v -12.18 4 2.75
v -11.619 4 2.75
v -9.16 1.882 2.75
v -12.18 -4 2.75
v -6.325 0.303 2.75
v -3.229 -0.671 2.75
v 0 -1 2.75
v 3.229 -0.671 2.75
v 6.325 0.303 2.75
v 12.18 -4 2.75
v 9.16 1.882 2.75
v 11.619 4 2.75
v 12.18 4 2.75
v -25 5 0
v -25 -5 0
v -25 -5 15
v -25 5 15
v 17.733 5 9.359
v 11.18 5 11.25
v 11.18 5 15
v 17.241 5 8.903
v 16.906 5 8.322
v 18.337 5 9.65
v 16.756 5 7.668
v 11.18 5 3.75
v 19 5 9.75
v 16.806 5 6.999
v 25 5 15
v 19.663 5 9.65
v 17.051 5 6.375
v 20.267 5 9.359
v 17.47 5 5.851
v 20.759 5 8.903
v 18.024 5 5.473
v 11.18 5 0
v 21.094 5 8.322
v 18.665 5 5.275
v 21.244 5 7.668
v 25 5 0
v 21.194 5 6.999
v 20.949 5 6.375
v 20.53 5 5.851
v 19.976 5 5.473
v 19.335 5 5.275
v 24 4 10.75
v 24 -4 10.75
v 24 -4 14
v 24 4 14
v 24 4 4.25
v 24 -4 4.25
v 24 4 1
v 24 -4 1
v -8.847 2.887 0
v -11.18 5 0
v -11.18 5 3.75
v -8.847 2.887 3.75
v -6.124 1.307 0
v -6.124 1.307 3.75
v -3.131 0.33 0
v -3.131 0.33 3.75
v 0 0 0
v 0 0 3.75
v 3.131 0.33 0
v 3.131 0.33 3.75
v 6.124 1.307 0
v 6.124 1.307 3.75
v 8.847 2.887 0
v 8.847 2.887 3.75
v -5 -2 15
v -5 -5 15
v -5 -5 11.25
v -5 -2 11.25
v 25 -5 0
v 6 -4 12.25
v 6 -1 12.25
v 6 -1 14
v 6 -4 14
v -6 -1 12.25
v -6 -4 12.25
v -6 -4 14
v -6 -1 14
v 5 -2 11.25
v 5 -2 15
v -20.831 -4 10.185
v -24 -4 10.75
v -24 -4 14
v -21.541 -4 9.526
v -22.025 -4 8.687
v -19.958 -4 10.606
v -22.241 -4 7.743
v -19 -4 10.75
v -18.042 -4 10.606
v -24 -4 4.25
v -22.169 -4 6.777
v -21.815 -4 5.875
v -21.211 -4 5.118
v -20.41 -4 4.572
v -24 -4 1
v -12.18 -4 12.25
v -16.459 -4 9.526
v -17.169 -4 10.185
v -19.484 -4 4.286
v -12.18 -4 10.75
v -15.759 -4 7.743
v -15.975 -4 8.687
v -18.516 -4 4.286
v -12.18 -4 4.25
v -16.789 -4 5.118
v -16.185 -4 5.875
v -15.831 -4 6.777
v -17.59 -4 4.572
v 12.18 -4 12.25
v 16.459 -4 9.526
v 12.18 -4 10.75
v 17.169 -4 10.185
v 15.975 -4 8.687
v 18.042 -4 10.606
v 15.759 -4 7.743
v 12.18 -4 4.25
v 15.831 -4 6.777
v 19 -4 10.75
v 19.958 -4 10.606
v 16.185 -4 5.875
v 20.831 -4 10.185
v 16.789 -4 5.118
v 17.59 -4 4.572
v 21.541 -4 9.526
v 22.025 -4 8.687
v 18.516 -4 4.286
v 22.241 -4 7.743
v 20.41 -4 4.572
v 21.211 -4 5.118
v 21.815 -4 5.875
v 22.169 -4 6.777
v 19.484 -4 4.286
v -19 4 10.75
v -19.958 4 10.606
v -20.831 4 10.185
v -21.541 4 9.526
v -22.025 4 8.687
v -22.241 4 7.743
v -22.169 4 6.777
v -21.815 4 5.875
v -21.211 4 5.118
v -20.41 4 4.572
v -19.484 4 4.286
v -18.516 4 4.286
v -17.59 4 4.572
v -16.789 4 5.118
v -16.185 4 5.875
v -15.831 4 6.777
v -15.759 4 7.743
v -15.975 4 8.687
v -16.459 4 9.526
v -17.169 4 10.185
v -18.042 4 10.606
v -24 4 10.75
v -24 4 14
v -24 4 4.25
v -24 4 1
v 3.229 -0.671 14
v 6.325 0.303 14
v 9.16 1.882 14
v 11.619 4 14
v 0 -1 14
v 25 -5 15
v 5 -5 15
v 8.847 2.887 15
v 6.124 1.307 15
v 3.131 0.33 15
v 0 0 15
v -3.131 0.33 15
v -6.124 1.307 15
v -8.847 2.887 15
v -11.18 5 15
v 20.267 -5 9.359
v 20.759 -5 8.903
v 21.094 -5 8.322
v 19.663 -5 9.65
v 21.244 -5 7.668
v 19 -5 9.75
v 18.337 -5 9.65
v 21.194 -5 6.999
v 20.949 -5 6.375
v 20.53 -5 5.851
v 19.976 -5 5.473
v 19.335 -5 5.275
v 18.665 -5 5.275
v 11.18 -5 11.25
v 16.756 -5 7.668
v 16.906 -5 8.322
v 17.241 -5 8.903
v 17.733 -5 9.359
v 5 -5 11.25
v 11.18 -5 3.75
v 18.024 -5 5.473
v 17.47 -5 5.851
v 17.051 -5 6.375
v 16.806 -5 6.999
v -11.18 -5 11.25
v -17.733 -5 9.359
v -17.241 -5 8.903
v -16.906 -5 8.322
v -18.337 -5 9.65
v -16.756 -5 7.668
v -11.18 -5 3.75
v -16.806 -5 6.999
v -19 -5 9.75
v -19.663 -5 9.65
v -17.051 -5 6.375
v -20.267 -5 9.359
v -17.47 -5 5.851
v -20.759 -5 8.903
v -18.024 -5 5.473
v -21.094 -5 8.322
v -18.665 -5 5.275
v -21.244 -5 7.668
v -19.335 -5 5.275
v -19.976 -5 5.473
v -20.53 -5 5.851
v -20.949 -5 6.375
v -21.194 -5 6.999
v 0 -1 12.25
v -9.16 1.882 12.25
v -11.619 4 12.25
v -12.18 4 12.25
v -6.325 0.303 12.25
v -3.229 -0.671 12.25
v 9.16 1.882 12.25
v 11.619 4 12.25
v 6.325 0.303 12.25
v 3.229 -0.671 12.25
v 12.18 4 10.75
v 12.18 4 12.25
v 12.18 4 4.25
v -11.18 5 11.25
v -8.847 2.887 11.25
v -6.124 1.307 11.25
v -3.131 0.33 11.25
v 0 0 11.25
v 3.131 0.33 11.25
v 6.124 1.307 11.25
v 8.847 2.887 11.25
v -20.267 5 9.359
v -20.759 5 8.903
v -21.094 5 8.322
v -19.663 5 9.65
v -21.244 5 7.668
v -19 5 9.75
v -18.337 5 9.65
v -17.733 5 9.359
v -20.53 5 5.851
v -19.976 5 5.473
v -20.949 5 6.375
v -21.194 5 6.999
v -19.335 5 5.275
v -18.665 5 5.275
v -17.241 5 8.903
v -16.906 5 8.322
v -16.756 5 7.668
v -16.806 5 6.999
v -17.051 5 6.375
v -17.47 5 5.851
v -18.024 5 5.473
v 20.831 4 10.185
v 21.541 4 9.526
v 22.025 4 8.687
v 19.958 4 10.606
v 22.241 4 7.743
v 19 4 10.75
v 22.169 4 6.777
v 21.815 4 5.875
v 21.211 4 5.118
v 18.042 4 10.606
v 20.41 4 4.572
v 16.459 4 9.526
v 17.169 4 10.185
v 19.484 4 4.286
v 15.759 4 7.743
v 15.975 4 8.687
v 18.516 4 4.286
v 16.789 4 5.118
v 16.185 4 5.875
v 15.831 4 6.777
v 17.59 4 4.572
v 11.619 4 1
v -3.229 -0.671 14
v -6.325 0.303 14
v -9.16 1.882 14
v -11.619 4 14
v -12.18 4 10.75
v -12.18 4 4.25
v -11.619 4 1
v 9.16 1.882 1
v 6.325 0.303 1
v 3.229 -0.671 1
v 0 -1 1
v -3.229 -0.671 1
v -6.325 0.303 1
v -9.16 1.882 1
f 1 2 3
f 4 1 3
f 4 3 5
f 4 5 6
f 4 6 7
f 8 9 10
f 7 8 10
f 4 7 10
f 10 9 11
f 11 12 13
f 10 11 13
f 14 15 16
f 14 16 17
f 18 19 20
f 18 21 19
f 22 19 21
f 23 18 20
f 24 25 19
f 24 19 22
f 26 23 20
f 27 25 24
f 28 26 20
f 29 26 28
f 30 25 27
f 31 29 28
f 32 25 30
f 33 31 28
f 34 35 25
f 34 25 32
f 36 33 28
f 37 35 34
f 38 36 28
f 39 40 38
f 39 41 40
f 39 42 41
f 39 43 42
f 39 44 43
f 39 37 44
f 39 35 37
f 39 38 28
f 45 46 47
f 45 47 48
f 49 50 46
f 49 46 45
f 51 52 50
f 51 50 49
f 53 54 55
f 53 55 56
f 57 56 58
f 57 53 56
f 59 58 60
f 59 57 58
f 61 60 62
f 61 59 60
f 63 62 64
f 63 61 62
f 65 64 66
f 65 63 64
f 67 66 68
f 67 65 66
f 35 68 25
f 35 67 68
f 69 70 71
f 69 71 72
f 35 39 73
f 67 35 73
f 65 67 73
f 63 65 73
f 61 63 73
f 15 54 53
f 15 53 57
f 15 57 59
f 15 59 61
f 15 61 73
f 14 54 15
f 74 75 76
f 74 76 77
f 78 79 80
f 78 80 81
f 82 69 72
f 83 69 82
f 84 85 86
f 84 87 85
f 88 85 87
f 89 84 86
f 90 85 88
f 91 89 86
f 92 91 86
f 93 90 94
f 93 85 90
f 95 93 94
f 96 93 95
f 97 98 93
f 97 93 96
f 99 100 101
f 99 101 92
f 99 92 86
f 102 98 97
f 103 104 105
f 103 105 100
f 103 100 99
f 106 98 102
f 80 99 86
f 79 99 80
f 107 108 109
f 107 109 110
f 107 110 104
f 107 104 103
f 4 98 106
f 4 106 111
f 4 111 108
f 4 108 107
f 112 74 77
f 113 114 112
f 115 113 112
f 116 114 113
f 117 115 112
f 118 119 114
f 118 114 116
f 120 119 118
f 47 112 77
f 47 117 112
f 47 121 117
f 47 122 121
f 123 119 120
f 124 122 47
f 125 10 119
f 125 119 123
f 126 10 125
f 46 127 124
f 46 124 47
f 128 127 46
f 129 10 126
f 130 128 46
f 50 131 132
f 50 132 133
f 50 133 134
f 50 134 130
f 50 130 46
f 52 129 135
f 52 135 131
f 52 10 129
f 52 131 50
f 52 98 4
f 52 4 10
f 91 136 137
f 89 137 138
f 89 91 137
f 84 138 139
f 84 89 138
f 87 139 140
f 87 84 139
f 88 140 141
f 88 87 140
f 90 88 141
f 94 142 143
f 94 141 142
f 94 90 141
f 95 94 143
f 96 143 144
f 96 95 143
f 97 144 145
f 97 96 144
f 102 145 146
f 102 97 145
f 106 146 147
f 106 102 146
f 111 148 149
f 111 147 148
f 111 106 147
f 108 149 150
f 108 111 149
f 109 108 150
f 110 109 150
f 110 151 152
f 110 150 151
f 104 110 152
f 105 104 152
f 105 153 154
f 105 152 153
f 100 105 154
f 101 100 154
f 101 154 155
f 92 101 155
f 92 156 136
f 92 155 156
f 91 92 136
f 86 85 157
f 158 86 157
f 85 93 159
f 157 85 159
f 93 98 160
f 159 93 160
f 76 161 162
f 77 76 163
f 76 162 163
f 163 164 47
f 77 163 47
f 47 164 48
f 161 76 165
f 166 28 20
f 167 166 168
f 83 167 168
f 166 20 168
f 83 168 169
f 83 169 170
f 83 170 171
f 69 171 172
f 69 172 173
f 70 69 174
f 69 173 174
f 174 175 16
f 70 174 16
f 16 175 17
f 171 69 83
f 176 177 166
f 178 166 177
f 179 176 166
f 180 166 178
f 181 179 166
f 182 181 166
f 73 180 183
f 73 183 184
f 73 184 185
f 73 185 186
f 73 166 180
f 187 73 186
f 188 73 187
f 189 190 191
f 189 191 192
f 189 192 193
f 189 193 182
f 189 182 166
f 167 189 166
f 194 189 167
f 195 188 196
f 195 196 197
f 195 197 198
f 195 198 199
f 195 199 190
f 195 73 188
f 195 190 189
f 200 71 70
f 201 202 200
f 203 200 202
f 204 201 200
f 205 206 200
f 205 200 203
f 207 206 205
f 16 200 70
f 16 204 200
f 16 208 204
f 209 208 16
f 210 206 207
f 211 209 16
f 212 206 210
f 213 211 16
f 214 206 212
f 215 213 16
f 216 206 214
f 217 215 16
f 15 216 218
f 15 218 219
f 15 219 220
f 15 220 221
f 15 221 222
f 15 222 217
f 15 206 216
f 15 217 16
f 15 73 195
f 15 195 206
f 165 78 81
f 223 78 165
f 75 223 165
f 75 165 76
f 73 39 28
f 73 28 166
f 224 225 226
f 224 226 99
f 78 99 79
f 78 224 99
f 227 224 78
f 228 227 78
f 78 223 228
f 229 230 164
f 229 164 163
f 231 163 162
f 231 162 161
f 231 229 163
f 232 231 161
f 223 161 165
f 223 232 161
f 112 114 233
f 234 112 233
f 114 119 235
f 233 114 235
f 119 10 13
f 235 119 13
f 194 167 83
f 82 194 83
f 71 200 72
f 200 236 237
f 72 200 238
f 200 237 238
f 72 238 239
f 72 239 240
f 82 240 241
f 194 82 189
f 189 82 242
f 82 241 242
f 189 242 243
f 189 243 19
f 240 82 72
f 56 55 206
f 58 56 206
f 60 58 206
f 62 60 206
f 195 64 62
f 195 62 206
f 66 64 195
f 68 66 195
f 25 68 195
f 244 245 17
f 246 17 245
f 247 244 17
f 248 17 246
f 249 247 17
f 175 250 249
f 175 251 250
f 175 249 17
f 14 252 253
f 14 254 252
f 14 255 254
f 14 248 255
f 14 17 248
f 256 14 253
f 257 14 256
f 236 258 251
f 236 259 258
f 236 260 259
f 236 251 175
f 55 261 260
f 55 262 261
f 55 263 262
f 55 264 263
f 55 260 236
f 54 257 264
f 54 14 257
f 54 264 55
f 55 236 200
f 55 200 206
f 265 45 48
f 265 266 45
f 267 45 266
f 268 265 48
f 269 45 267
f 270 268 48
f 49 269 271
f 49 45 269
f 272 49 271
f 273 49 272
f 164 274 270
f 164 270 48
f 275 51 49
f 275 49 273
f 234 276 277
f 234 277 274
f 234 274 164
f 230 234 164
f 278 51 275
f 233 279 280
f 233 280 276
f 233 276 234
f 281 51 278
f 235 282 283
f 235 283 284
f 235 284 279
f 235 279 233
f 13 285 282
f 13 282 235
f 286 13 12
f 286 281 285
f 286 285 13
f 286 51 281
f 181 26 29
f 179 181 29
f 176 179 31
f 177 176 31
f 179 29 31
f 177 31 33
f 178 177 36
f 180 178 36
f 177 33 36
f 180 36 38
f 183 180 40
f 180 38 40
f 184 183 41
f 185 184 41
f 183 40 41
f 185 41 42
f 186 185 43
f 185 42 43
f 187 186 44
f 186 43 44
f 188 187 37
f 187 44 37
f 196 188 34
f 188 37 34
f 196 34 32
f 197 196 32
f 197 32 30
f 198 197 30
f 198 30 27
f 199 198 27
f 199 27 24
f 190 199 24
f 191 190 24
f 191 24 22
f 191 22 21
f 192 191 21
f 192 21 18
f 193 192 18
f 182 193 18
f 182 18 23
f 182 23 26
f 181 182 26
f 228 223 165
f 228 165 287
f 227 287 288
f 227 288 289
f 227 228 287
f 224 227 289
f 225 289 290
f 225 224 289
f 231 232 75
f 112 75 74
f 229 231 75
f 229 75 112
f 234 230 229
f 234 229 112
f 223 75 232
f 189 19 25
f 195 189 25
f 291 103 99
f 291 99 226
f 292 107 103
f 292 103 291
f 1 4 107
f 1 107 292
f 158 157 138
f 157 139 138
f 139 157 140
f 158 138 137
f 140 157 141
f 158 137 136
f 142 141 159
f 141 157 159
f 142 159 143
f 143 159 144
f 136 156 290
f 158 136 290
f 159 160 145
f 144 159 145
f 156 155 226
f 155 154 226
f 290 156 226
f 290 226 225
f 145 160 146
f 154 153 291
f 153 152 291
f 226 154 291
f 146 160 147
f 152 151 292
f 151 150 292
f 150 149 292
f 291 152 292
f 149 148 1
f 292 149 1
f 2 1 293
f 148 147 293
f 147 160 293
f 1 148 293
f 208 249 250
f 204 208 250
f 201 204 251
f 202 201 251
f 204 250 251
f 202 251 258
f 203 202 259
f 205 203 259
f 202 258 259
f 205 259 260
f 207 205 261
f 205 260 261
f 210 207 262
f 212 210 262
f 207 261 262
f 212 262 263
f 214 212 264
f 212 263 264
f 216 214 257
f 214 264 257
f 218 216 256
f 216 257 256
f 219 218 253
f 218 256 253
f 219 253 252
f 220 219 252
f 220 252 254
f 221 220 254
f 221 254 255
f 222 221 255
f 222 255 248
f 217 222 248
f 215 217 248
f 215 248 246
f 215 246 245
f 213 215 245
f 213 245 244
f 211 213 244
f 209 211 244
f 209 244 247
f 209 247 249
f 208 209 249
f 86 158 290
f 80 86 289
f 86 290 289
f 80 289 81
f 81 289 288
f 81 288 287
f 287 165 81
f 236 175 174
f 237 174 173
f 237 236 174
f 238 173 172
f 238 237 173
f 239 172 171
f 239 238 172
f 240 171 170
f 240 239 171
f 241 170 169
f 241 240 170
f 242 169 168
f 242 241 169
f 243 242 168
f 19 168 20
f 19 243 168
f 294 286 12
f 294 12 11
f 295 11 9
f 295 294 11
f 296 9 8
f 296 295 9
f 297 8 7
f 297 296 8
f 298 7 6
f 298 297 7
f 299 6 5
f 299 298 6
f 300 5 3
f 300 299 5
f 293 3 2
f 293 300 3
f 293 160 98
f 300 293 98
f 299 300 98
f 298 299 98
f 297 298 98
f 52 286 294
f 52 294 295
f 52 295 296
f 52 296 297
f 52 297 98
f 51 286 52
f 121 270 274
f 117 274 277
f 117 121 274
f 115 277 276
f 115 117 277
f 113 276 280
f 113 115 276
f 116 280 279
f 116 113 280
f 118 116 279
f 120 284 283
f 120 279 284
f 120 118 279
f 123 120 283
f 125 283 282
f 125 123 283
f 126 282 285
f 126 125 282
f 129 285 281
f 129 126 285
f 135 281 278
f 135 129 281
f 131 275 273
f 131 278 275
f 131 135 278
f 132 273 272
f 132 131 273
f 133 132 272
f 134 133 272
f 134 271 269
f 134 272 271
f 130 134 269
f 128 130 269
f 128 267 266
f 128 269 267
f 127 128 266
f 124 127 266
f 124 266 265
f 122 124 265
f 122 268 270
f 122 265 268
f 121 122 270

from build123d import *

# Parameters (mm, degrees)
BOSS_EXTRUDE1_DEPTH = 15
CUT_EXTRUDE1_REACH  = 32.822
SKETCH3_W           = 22.360679774
SKETCH3_H           = 7.5
CUT_EXTRUDE2_REACH  = 31.58
SKETCH2_W           = 10
SKETCH2_H           = 3
CUT_EXTRUDE3_REACH  = 32.822
SKETCH4_R           = 2.25
SHELL2_START        = 1
SHELL2_OUTLINE_W    = 11.819660113
SHELL2_OUTLINE_H    = 8
SHELL2_DEPTH        = 3.2499999
SHELL2_START_2      = 10.7500001
SHELL2_2_OUTLINE_W  = 11.819660113
SHELL2_2_OUTLINE_H  = 8
SHELL2_2_DEPTH      = 3.2499999
SHELL2_3_DEPTH      = 1.75
SHELL2_START_3      = 12.25
SHELL2_4_DEPTH      = 1.75
SHELL2_START_4      = -4
SHELL2_5_DEPTH      = 8


with BuildPart() as part:
    # Sketch1 → Boss-Extrude1 (new body)
    with BuildSketch(Plane.XY):
        with BuildLine():
            Line((-25, 5), (-11.180339887, 5))
            ThreePointArc((-11.180339887, 5), (0, 0), (11.180339887, 5))
            Line((11.180339887, 5), (25, 5))
            Line((25, 5), (25, -5))
            Line((25, -5), (-25, -5))
            Line((-25, -5), (-25, 5))
        make_face()
    extrude(amount=BOSS_EXTRUDE1_DEPTH)

    # Sketch3 → Cut-Extrude1 (cut, up to next)
    with BuildSketch(Plane(origin=(0, 5, 0), x_dir=(1, 0, 0), z_dir=(0, 1, 0)), mode=Mode.PRIVATE) as cut_extrude1_sk1:
        with Locations((0, -7.5)):
            Rectangle(SKETCH3_W, SKETCH3_H)
    cut_extrude1_tool1 = extrude(cut_extrude1_sk1.sketch, amount=-CUT_EXTRUDE1_REACH, mode=Mode.PRIVATE) & part.part
    add(cut_extrude1_tool1.solids().sort_by_distance((0, 5, 7.5))[0], mode=Mode.SUBTRACT)

    # Sketch2 → Cut-Extrude2 (cut, up to next)
    with BuildSketch(Plane.XY.offset(15), mode=Mode.PRIVATE) as cut_extrude2_sk1:
        with Locations((0, -3.5)):
            Rectangle(SKETCH2_W, SKETCH2_H)
    cut_extrude2_tool1 = extrude(cut_extrude2_sk1.sketch, amount=-CUT_EXTRUDE2_REACH, mode=Mode.PRIVATE) & part.part
    add(cut_extrude2_tool1.solids().sort_by_distance((0, -3.5, 15))[0], mode=Mode.SUBTRACT)

    # Sketch4 → Cut-Extrude3 (cut, up to next)
    with BuildSketch(Plane(origin=(0, 5, 0), x_dir=(1, 0, 0), z_dir=(0, 1, 0)), mode=Mode.PRIVATE) as cut_extrude3_sk1:
        with Locations(Location((-19, -7.5, 0), (0, 0, 270))):
            Circle(SKETCH4_R)
    cut_extrude3_tool1 = extrude(cut_extrude3_sk1.sketch, amount=-CUT_EXTRUDE3_REACH, mode=Mode.PRIVATE) & part.part
    # Sketch4 → Cut-Extrude3 (cut, up to next)
    with BuildSketch(Plane(origin=(0, 5, 0), x_dir=(1, 0, 0), z_dir=(0, 1, 0)), mode=Mode.PRIVATE) as cut_extrude3_sk2:
        with Locations(Location((19, -7.5, 0), (0, 0, 270))):
            Circle(SKETCH4_R)
    cut_extrude3_tool2 = extrude(cut_extrude3_sk2.sketch, amount=-CUT_EXTRUDE3_REACH, mode=Mode.PRIVATE) & part.part
    add(cut_extrude3_tool1.solids().sort_by_distance((-19, 5, 7.5))[0], mode=Mode.SUBTRACT)
    add(cut_extrude3_tool2.solids().sort_by_distance((19, 5, 7.5))[0], mode=Mode.SUBTRACT)

    # Shell2: read off the stored shape, not the designer's step
    # Shell2 outline → Shell2 (cut)
    with BuildSketch(Plane.XY.offset(SHELL2_START)):
        with Locations((18.090169944, 0)):
            Rectangle(SHELL2_OUTLINE_W, SHELL2_OUTLINE_H)
        with Locations((-18.090169944, 0)):
            Rectangle(SHELL2_OUTLINE_W, SHELL2_OUTLINE_H)
    extrude(amount=SHELL2_DEPTH, mode=Mode.SUBTRACT)

    # Shell2 2 outline → Shell2 2 (cut)
    with BuildSketch(Plane.XY.offset(SHELL2_START_2)):
        with Locations((18.090169944, 0)):
            Rectangle(SHELL2_2_OUTLINE_W, SHELL2_2_OUTLINE_H)
        with Locations((-18.090169944, 0)):
            Rectangle(SHELL2_2_OUTLINE_W, SHELL2_2_OUTLINE_H)
    extrude(amount=SHELL2_2_DEPTH, mode=Mode.SUBTRACT)

    # Shell2 3 outline → Shell2 3 (cut)
    with BuildSketch(Plane.XY.offset(SHELL2_START)):
        with BuildLine():
            Line((12.180339887, 4), (11.618950039, 4))
            ThreePointArc((11.618950039, 4), (0, -1), (-11.618950039, 4))
            Line((-11.618950039, 4), (-12.180339887, 4))
            Line((-12.180339887, 4), (-12.180339887, -4))
            Line((-12.180339887, -4), (12.180339887, -4))
            Line((12.180339887, -4), (12.180339887, 4))
        make_face()
    extrude(amount=SHELL2_3_DEPTH, mode=Mode.SUBTRACT)

    # Shell2 4 outline → Shell2 4 (cut)
    with BuildSketch(Plane.XY.offset(SHELL2_START_3)):
        with BuildLine():
            Line((12.180339887, 4), (11.618950039, 4))
            ThreePointArc((11.618950039, 4), (6.324555321, 0.303061543), (0, -1))
            Line((0, -1), (6, -1))
            Line((6, -1), (6, -4))
            Line((6, -4), (12.180339887, -4))
            Line((12.180339887, -4), (12.180339887, 4))
        make_face()
        with BuildLine():
            Line((-6, -1), (0, -1))
            ThreePointArc((0, -1), (-6.324555321, 0.303061543), (-11.618950039, 4))
            Line((-11.618950039, 4), (-12.180339887, 4))
            Line((-12.180339887, 4), (-12.180339887, -4))
            Line((-12.180339887, -4), (-6, -4))
            Line((-6, -4), (-6, -1))
        make_face()
    extrude(amount=SHELL2_4_DEPTH, mode=Mode.SUBTRACT)

    # Shell2 5 outline → Shell2 5 (cut)
    with BuildSketch(Plane(origin=(0, 0, 0), x_dir=(1, 0, 0), z_dir=(0, 1, 0)).offset(SHELL2_START_4)):
        with BuildLine():
            Line((24, -10.7500001), (24, -4.2499999))
            Line((24, -4.2499999), (19, -4.25))
            ThreePointArc((19, -4.25), (22.25, -7.5), (19, -10.75))
            Line((19, -10.75), (24, -10.7500001))
        make_face()
        with BuildLine():
            ThreePointArc((19, -10.75), (15.75, -7.5), (19, -4.25))
            Line((19, -4.25), (12.180339887, -4.2499999))
            Line((12.180339887, -4.2499999), (12.180339887, -10.7500001))
            Line((12.180339887, -10.7500001), (19, -10.75))
        make_face()
        with BuildLine():
            Line((-24, -4.2499999), (-24, -10.7500001))
            Line((-24, -10.7500001), (-19, -10.75))
            ThreePointArc((-19, -10.75), (-22.25, -7.5), (-19, -4.25))
            Line((-19, -4.25), (-24, -4.2499999))
        make_face()
        with BuildLine():
            ThreePointArc((-19, -4.25), (-15.75, -7.5), (-19, -10.75))
            Line((-19, -10.75), (-12.180339887, -10.7500001))
            Line((-12.180339887, -10.7500001), (-12.180339887, -4.2499999))
            Line((-12.180339887, -4.2499999), (-19, -4.25))
        make_face()
    extrude(amount=SHELL2_5_DEPTH, mode=Mode.SUBTRACT)


solid = part.part
